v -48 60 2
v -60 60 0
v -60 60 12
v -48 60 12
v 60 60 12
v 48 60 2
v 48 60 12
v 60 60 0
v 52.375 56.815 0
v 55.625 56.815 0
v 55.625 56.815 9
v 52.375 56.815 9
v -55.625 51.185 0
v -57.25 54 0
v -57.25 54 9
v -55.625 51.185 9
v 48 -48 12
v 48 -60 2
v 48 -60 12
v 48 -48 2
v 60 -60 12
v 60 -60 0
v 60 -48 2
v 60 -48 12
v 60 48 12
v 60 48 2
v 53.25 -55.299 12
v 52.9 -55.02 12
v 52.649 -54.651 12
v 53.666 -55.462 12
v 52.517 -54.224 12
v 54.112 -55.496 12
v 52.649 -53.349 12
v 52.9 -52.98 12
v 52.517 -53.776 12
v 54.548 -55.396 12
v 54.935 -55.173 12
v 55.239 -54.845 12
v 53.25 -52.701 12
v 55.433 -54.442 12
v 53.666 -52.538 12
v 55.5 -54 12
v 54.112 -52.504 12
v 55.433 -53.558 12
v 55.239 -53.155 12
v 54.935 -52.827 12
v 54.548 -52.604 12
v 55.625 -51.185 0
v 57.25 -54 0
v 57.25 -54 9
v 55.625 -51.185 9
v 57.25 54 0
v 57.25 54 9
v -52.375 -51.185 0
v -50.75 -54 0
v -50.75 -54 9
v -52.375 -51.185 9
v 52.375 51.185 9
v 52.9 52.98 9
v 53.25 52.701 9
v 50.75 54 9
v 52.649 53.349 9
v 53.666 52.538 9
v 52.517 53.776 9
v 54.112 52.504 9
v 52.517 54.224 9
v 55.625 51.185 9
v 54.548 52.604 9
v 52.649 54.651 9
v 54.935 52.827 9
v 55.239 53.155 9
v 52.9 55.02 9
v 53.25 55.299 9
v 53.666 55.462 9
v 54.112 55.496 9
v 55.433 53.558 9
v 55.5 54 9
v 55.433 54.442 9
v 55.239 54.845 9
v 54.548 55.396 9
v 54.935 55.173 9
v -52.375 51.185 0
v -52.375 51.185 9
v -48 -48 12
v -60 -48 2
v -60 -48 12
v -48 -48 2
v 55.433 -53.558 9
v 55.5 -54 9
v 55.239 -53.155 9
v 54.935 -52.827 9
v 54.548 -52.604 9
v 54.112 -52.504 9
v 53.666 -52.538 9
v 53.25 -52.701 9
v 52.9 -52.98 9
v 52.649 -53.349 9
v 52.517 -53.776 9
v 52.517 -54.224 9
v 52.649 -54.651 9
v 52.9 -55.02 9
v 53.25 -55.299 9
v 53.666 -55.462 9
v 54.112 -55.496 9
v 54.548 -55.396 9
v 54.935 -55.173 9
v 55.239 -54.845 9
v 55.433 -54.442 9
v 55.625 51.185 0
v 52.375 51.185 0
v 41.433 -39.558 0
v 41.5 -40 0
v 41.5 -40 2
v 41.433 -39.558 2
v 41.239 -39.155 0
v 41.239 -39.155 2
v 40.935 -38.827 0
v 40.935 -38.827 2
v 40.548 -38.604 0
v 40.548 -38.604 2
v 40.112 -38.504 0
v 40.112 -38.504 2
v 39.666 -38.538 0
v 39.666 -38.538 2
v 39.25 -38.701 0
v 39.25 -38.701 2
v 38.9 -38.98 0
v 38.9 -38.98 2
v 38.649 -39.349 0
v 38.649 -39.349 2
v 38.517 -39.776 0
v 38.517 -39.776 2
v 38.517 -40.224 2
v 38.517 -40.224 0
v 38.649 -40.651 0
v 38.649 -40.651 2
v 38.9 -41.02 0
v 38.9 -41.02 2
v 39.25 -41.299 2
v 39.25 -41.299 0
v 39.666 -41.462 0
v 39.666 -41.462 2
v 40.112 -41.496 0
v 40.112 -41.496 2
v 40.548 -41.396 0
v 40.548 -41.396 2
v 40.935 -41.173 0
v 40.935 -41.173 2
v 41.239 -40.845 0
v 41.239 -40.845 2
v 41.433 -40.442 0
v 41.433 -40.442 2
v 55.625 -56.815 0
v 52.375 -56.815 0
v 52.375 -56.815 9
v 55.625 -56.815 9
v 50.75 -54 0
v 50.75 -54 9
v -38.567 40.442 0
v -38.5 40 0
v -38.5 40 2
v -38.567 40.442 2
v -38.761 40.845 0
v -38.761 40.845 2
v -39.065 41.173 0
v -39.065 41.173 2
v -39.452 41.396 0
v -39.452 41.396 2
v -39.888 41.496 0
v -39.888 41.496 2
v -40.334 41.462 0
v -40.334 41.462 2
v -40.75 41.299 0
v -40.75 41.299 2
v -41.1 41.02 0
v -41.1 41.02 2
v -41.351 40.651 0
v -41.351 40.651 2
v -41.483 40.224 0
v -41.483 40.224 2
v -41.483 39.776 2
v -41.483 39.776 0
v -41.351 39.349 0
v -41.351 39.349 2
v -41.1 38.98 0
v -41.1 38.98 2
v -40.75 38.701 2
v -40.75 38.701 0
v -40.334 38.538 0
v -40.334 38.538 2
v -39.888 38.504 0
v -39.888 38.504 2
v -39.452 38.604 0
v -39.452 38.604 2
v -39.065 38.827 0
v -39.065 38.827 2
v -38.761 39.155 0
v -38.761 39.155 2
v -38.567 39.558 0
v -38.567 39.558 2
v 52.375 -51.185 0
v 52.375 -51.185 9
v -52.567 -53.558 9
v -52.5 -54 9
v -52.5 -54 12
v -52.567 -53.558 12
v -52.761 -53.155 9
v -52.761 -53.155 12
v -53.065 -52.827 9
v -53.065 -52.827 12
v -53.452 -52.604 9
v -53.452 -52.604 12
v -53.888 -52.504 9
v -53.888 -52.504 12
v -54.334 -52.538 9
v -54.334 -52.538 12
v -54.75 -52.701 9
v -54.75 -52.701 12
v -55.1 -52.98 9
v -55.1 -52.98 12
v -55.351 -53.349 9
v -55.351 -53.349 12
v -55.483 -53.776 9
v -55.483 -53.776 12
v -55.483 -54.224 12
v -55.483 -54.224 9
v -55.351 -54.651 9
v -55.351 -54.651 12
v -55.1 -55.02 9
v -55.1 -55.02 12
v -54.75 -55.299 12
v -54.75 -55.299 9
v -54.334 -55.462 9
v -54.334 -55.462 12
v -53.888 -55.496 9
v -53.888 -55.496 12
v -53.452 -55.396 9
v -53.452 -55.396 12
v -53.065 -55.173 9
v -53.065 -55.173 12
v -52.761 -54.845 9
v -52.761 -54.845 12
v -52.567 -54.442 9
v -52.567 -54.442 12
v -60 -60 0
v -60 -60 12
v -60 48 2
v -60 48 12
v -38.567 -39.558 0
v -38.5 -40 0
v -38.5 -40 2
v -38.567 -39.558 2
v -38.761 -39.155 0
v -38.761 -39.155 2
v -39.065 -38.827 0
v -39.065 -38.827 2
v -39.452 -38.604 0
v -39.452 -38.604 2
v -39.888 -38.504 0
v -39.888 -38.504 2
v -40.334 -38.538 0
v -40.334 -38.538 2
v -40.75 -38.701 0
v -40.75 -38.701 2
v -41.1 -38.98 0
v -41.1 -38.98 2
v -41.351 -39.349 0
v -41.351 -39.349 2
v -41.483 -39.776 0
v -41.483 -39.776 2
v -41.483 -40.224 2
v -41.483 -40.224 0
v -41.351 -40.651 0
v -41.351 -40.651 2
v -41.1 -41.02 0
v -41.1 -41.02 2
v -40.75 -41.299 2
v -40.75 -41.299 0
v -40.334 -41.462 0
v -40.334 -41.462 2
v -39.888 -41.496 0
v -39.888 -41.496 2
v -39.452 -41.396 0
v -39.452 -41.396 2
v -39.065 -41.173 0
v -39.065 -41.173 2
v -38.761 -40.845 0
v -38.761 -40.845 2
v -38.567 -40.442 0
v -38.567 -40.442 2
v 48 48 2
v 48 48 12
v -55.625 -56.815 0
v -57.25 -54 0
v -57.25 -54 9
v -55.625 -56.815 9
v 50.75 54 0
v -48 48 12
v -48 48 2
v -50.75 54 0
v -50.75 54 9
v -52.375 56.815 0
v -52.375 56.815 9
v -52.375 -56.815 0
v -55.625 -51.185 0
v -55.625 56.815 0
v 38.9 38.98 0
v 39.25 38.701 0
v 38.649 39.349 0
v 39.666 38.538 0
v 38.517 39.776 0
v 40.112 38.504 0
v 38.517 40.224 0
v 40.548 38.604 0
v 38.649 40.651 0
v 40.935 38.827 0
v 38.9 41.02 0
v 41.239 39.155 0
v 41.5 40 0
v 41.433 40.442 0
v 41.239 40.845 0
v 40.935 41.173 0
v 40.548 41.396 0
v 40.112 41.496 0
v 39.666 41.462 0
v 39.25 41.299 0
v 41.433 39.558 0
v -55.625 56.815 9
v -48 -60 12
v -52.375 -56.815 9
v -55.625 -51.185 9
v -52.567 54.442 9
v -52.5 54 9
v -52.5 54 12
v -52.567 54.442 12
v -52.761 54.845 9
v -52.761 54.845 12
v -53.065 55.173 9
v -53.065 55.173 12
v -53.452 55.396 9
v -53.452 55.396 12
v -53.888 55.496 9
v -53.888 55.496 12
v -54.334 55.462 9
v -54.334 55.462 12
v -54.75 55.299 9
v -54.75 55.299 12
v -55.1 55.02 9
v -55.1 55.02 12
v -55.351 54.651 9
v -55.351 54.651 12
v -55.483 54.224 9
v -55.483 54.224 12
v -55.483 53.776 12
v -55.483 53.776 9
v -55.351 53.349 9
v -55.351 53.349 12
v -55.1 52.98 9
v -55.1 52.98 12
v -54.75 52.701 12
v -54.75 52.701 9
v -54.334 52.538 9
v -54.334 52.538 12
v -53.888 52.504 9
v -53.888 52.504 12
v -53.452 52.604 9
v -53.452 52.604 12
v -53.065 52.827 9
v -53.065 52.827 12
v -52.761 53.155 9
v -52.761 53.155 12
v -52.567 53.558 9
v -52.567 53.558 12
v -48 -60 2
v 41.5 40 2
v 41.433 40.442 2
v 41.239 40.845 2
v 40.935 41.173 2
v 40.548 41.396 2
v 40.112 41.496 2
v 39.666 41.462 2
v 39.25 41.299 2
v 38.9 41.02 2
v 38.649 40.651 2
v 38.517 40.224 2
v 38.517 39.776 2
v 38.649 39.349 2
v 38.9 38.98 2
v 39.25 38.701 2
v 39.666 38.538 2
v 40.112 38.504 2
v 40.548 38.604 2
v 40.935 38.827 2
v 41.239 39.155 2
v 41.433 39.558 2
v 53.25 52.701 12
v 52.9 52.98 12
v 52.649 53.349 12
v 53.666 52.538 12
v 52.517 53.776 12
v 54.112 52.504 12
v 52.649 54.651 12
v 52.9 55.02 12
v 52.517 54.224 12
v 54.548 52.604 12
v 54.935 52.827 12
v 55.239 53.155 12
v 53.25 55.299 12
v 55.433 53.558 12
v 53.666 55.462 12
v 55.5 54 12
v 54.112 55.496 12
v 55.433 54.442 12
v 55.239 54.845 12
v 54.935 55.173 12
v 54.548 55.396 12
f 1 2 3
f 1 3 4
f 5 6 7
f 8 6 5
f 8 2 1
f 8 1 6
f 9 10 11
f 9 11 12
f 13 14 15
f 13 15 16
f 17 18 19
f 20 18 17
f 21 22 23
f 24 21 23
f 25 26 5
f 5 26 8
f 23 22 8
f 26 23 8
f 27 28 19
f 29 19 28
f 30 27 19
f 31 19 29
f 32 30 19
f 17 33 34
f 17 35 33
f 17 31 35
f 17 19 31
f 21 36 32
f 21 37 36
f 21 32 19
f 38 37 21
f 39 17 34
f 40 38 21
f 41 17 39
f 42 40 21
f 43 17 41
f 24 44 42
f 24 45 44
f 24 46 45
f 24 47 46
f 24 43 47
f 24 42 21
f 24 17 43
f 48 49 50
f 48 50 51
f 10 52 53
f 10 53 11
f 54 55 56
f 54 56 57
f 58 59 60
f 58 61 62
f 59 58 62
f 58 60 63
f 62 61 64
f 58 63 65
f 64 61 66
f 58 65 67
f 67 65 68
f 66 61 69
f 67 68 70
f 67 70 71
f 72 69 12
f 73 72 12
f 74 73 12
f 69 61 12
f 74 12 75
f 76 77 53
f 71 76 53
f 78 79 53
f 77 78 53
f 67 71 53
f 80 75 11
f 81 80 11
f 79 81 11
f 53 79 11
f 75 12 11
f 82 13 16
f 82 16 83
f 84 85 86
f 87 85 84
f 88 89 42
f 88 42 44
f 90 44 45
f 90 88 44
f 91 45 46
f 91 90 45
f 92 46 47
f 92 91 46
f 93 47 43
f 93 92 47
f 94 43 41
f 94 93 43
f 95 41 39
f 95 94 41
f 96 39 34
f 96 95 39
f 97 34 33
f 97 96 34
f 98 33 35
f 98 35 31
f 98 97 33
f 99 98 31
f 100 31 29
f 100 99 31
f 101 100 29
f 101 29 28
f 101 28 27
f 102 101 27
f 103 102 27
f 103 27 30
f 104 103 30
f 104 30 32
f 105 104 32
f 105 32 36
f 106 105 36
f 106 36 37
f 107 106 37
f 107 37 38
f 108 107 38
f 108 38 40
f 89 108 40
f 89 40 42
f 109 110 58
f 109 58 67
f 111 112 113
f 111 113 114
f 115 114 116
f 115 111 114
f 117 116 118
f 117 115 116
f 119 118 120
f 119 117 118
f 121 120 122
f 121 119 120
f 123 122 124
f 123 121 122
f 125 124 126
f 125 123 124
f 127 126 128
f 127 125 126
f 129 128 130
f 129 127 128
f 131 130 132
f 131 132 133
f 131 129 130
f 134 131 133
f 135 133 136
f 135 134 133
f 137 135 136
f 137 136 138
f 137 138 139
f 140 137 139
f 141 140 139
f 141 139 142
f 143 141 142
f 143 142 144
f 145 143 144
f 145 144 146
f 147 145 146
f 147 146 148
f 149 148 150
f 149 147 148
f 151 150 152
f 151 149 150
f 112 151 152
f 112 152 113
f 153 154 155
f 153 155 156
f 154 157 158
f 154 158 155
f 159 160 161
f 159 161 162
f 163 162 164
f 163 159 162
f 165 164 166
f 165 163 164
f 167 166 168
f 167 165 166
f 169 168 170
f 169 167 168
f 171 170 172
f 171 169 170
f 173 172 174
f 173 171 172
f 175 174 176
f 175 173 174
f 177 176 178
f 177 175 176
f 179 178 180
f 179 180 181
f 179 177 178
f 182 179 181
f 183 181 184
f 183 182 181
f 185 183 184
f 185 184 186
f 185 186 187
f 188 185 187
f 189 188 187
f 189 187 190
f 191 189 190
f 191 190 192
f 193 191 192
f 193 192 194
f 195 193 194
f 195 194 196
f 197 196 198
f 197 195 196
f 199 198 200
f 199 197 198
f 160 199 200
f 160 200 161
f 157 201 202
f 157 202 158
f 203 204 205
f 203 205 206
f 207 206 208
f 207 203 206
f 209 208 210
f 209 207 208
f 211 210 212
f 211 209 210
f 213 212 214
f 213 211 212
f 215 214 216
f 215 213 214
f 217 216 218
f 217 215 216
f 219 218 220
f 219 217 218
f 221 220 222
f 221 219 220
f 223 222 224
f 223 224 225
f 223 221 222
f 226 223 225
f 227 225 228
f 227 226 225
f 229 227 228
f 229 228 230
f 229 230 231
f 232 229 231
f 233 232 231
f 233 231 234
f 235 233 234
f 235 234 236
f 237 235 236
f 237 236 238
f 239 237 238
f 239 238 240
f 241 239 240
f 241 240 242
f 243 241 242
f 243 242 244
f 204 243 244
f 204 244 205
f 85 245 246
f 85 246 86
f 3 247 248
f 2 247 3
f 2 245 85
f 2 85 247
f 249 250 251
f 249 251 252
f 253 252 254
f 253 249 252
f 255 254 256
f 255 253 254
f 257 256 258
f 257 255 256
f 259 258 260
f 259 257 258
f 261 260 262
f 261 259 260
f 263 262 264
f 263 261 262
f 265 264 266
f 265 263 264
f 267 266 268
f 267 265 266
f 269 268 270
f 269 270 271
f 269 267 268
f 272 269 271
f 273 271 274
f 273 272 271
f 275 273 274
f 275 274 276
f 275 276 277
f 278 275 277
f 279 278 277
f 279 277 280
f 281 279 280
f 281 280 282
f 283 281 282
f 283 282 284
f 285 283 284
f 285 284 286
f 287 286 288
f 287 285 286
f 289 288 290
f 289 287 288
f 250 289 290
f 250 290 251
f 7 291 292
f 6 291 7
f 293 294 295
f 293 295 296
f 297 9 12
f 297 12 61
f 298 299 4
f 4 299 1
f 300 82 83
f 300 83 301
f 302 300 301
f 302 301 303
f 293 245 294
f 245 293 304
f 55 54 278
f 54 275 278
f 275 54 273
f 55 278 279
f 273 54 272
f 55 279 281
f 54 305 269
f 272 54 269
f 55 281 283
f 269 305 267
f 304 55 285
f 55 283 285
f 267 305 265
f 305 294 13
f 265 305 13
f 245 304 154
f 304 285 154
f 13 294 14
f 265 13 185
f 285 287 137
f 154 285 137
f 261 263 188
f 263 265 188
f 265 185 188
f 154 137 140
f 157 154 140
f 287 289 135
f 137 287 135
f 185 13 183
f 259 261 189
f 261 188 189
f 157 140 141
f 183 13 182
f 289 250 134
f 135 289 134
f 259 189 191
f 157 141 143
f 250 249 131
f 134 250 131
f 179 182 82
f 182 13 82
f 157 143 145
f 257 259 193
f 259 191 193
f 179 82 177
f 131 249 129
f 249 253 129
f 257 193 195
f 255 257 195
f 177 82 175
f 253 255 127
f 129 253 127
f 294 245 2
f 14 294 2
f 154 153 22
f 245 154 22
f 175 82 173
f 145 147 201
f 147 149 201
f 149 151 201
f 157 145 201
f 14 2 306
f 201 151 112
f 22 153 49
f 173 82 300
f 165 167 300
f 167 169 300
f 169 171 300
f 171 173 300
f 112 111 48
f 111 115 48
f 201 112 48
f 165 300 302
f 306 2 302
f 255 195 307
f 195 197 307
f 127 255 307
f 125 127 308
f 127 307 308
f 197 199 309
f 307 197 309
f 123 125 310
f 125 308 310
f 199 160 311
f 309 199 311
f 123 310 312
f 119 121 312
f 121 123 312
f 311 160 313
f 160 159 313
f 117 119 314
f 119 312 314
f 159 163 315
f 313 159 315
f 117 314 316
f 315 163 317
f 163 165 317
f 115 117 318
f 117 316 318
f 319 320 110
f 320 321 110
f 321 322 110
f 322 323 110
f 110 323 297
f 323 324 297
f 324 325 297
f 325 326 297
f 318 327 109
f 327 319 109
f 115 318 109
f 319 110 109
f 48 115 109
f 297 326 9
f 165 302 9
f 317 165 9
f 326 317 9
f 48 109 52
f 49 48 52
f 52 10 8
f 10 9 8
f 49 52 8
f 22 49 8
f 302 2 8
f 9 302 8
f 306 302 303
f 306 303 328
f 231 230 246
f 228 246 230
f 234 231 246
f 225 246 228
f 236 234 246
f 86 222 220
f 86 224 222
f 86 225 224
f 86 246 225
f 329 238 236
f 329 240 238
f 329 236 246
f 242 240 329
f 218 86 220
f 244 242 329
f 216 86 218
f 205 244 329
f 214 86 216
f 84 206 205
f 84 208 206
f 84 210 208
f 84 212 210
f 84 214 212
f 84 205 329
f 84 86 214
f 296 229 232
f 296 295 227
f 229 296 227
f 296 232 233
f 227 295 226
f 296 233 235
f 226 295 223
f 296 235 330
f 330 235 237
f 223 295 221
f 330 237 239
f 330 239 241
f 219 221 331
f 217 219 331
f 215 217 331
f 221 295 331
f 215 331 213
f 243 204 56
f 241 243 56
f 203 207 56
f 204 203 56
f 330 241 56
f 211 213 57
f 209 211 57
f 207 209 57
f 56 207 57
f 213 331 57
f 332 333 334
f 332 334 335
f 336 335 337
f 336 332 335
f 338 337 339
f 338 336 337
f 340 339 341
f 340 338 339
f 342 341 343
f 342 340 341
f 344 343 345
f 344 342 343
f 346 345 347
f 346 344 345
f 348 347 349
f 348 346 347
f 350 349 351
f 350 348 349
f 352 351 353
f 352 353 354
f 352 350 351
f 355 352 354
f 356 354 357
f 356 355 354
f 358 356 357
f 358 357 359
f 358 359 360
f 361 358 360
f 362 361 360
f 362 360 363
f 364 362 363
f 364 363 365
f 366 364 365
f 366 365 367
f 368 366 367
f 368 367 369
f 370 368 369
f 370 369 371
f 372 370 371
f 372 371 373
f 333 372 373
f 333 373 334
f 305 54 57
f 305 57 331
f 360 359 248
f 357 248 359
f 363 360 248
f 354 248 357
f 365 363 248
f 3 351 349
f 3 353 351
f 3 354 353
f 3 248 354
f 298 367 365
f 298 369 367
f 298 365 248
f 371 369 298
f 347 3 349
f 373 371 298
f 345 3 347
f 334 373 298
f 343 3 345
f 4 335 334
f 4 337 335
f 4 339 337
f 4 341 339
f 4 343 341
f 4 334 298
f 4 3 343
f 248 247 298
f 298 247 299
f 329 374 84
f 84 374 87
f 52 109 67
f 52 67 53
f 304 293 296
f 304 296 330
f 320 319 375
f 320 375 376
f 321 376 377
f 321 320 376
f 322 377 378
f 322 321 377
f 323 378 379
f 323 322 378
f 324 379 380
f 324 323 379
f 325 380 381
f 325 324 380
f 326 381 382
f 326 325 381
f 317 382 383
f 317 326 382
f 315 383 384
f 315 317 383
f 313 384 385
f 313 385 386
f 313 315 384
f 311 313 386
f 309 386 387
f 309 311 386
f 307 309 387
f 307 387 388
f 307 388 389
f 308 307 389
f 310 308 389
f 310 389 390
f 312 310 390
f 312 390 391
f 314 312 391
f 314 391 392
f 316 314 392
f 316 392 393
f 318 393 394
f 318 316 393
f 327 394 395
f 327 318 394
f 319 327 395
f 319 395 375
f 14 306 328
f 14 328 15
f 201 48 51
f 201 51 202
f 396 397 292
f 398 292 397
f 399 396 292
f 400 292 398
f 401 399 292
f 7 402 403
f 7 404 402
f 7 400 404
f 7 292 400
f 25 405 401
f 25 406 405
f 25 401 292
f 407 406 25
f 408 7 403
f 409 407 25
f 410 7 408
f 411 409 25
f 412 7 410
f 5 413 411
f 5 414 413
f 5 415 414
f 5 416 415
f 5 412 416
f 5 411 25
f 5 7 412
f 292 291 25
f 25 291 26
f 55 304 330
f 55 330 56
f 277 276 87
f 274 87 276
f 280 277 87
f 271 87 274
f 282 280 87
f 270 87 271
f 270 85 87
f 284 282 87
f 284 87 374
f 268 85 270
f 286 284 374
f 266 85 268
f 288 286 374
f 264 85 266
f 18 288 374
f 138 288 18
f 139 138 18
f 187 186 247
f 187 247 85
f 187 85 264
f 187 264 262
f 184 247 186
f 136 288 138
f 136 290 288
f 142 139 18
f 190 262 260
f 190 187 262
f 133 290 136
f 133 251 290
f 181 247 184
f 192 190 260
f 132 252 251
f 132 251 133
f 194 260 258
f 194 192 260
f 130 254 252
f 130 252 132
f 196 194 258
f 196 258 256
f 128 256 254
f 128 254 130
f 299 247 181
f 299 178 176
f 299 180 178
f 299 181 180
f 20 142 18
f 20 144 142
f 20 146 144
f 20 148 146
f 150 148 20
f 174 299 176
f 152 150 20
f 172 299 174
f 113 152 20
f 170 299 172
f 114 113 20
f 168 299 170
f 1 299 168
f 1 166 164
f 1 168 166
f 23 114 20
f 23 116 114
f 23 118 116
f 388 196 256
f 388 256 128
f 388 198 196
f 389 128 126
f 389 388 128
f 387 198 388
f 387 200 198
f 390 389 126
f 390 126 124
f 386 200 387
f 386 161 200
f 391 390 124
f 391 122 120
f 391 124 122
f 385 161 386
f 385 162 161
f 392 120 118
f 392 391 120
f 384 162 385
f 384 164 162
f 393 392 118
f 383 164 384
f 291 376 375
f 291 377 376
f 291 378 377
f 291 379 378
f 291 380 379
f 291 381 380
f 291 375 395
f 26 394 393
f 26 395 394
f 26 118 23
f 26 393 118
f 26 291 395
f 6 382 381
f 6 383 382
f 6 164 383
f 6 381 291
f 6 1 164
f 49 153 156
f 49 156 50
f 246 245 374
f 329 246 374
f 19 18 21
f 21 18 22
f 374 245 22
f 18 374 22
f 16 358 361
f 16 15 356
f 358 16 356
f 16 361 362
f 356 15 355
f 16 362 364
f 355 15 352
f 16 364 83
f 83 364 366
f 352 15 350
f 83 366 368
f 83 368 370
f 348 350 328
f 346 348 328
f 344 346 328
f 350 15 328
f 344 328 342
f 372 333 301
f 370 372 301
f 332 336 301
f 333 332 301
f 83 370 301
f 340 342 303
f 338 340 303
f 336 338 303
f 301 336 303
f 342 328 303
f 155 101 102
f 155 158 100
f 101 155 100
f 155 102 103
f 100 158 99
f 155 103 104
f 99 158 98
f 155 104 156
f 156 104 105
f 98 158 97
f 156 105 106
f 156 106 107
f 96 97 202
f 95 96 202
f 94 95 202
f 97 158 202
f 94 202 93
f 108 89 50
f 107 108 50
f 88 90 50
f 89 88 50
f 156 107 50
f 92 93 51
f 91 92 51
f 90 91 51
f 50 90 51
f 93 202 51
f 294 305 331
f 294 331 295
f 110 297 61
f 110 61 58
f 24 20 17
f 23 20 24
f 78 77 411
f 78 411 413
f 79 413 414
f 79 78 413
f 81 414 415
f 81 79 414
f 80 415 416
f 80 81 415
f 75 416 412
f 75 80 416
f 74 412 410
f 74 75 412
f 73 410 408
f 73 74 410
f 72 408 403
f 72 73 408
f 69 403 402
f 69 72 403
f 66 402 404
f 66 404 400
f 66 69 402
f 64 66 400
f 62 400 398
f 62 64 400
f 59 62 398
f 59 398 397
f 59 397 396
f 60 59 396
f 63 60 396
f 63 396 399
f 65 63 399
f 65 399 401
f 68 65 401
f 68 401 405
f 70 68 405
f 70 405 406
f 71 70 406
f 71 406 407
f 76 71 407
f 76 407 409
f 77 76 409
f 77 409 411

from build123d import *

# Parameters (mm, degrees)
SKETCH_W     = 120
SKETCH_H     = 120
SKETCH_R     = 1.5
PAD_DEPTH    = 2
SKETCH002_W  = 12
SKETCH002_H  = 12
SKETCH002_R  = 1.5
PAD001_DEPTH = 12
POCKET_DEPTH = 9


with BuildPart() as part:
    # Sketch → Pad (new body)
    with BuildSketch(Plane.XY):
        Rectangle(SKETCH_W, SKETCH_H)
        with Locations((-40, 40)):
            Circle(SKETCH_R, mode=Mode.SUBTRACT)
        with Locations((40, 40)):
            Circle(SKETCH_R, mode=Mode.SUBTRACT)
        with Locations((40, -40)):
            Circle(SKETCH_R, mode=Mode.SUBTRACT)
        with Locations((-40, -40)):
            Circle(SKETCH_R, mode=Mode.SUBTRACT)
        with Locations((-54, 54)):
            Circle(SKETCH_R, mode=Mode.SUBTRACT)
        with Locations((54, 54)):
            Circle(SKETCH_R, mode=Mode.SUBTRACT)
        with Locations((54, -54)):
            Circle(SKETCH_R, mode=Mode.SUBTRACT)
        with Locations((-54, -54)):
            Circle(SKETCH_R, mode=Mode.SUBTRACT)
    extrude(amount=PAD_DEPTH)

    # Sketch002 → Pad001 (join)
    with BuildSketch(Plane.XY):
        with Locations((-54, -54)):
            Rectangle(SKETCH002_W, SKETCH002_H)
        with Locations((-54, -54)):
            Circle(SKETCH002_R, mode=Mode.SUBTRACT)
        with Locations((54, -54)):
            Rectangle(SKETCH002_W, SKETCH002_H)
        with Locations((54, -54)):
            Circle(SKETCH002_R, mode=Mode.SUBTRACT)
        with Locations((54, 54)):
            Rectangle(SKETCH002_W, SKETCH002_H)
        with Locations((54, 54)):
            Circle(SKETCH002_R, mode=Mode.SUBTRACT)
        with Locations((-54, 54)):
            Rectangle(SKETCH002_W, SKETCH002_H)
        with Locations((-54, 54)):
            Circle(SKETCH002_R, mode=Mode.SUBTRACT)
    extrude(amount=PAD001_DEPTH)

    # Sketch001 → Pocket (cut)
    with BuildSketch(Plane.XY):
        Polygon((-52.375, 51.185417), (-50.75, 54), (-52.375, 56.814583), (-55.625, 56.814583), (-57.25, 54), (-55.625, 51.185417), align=None)
        Polygon((57.25, 54), (55.625, 56.814583), (52.375, 56.814583), (50.75, 54), (52.375, 51.185417), (55.625, 51.185417), align=None)
        Polygon((-50.75, -54), (-52.375, -51.185417), (-55.625, -51.185417), (-57.25, -54), (-55.625, -56.814583), (-52.375, -56.814583), align=None)
        Polygon((57.25, -54), (55.625, -51.185417), (52.375, -51.185417), (50.75, -54), (52.375, -56.814583), (55.625, -56.814583), align=None)
    extrude(amount=POCKET_DEPTH, mode=Mode.SUBTRACT)


solid = part.part
